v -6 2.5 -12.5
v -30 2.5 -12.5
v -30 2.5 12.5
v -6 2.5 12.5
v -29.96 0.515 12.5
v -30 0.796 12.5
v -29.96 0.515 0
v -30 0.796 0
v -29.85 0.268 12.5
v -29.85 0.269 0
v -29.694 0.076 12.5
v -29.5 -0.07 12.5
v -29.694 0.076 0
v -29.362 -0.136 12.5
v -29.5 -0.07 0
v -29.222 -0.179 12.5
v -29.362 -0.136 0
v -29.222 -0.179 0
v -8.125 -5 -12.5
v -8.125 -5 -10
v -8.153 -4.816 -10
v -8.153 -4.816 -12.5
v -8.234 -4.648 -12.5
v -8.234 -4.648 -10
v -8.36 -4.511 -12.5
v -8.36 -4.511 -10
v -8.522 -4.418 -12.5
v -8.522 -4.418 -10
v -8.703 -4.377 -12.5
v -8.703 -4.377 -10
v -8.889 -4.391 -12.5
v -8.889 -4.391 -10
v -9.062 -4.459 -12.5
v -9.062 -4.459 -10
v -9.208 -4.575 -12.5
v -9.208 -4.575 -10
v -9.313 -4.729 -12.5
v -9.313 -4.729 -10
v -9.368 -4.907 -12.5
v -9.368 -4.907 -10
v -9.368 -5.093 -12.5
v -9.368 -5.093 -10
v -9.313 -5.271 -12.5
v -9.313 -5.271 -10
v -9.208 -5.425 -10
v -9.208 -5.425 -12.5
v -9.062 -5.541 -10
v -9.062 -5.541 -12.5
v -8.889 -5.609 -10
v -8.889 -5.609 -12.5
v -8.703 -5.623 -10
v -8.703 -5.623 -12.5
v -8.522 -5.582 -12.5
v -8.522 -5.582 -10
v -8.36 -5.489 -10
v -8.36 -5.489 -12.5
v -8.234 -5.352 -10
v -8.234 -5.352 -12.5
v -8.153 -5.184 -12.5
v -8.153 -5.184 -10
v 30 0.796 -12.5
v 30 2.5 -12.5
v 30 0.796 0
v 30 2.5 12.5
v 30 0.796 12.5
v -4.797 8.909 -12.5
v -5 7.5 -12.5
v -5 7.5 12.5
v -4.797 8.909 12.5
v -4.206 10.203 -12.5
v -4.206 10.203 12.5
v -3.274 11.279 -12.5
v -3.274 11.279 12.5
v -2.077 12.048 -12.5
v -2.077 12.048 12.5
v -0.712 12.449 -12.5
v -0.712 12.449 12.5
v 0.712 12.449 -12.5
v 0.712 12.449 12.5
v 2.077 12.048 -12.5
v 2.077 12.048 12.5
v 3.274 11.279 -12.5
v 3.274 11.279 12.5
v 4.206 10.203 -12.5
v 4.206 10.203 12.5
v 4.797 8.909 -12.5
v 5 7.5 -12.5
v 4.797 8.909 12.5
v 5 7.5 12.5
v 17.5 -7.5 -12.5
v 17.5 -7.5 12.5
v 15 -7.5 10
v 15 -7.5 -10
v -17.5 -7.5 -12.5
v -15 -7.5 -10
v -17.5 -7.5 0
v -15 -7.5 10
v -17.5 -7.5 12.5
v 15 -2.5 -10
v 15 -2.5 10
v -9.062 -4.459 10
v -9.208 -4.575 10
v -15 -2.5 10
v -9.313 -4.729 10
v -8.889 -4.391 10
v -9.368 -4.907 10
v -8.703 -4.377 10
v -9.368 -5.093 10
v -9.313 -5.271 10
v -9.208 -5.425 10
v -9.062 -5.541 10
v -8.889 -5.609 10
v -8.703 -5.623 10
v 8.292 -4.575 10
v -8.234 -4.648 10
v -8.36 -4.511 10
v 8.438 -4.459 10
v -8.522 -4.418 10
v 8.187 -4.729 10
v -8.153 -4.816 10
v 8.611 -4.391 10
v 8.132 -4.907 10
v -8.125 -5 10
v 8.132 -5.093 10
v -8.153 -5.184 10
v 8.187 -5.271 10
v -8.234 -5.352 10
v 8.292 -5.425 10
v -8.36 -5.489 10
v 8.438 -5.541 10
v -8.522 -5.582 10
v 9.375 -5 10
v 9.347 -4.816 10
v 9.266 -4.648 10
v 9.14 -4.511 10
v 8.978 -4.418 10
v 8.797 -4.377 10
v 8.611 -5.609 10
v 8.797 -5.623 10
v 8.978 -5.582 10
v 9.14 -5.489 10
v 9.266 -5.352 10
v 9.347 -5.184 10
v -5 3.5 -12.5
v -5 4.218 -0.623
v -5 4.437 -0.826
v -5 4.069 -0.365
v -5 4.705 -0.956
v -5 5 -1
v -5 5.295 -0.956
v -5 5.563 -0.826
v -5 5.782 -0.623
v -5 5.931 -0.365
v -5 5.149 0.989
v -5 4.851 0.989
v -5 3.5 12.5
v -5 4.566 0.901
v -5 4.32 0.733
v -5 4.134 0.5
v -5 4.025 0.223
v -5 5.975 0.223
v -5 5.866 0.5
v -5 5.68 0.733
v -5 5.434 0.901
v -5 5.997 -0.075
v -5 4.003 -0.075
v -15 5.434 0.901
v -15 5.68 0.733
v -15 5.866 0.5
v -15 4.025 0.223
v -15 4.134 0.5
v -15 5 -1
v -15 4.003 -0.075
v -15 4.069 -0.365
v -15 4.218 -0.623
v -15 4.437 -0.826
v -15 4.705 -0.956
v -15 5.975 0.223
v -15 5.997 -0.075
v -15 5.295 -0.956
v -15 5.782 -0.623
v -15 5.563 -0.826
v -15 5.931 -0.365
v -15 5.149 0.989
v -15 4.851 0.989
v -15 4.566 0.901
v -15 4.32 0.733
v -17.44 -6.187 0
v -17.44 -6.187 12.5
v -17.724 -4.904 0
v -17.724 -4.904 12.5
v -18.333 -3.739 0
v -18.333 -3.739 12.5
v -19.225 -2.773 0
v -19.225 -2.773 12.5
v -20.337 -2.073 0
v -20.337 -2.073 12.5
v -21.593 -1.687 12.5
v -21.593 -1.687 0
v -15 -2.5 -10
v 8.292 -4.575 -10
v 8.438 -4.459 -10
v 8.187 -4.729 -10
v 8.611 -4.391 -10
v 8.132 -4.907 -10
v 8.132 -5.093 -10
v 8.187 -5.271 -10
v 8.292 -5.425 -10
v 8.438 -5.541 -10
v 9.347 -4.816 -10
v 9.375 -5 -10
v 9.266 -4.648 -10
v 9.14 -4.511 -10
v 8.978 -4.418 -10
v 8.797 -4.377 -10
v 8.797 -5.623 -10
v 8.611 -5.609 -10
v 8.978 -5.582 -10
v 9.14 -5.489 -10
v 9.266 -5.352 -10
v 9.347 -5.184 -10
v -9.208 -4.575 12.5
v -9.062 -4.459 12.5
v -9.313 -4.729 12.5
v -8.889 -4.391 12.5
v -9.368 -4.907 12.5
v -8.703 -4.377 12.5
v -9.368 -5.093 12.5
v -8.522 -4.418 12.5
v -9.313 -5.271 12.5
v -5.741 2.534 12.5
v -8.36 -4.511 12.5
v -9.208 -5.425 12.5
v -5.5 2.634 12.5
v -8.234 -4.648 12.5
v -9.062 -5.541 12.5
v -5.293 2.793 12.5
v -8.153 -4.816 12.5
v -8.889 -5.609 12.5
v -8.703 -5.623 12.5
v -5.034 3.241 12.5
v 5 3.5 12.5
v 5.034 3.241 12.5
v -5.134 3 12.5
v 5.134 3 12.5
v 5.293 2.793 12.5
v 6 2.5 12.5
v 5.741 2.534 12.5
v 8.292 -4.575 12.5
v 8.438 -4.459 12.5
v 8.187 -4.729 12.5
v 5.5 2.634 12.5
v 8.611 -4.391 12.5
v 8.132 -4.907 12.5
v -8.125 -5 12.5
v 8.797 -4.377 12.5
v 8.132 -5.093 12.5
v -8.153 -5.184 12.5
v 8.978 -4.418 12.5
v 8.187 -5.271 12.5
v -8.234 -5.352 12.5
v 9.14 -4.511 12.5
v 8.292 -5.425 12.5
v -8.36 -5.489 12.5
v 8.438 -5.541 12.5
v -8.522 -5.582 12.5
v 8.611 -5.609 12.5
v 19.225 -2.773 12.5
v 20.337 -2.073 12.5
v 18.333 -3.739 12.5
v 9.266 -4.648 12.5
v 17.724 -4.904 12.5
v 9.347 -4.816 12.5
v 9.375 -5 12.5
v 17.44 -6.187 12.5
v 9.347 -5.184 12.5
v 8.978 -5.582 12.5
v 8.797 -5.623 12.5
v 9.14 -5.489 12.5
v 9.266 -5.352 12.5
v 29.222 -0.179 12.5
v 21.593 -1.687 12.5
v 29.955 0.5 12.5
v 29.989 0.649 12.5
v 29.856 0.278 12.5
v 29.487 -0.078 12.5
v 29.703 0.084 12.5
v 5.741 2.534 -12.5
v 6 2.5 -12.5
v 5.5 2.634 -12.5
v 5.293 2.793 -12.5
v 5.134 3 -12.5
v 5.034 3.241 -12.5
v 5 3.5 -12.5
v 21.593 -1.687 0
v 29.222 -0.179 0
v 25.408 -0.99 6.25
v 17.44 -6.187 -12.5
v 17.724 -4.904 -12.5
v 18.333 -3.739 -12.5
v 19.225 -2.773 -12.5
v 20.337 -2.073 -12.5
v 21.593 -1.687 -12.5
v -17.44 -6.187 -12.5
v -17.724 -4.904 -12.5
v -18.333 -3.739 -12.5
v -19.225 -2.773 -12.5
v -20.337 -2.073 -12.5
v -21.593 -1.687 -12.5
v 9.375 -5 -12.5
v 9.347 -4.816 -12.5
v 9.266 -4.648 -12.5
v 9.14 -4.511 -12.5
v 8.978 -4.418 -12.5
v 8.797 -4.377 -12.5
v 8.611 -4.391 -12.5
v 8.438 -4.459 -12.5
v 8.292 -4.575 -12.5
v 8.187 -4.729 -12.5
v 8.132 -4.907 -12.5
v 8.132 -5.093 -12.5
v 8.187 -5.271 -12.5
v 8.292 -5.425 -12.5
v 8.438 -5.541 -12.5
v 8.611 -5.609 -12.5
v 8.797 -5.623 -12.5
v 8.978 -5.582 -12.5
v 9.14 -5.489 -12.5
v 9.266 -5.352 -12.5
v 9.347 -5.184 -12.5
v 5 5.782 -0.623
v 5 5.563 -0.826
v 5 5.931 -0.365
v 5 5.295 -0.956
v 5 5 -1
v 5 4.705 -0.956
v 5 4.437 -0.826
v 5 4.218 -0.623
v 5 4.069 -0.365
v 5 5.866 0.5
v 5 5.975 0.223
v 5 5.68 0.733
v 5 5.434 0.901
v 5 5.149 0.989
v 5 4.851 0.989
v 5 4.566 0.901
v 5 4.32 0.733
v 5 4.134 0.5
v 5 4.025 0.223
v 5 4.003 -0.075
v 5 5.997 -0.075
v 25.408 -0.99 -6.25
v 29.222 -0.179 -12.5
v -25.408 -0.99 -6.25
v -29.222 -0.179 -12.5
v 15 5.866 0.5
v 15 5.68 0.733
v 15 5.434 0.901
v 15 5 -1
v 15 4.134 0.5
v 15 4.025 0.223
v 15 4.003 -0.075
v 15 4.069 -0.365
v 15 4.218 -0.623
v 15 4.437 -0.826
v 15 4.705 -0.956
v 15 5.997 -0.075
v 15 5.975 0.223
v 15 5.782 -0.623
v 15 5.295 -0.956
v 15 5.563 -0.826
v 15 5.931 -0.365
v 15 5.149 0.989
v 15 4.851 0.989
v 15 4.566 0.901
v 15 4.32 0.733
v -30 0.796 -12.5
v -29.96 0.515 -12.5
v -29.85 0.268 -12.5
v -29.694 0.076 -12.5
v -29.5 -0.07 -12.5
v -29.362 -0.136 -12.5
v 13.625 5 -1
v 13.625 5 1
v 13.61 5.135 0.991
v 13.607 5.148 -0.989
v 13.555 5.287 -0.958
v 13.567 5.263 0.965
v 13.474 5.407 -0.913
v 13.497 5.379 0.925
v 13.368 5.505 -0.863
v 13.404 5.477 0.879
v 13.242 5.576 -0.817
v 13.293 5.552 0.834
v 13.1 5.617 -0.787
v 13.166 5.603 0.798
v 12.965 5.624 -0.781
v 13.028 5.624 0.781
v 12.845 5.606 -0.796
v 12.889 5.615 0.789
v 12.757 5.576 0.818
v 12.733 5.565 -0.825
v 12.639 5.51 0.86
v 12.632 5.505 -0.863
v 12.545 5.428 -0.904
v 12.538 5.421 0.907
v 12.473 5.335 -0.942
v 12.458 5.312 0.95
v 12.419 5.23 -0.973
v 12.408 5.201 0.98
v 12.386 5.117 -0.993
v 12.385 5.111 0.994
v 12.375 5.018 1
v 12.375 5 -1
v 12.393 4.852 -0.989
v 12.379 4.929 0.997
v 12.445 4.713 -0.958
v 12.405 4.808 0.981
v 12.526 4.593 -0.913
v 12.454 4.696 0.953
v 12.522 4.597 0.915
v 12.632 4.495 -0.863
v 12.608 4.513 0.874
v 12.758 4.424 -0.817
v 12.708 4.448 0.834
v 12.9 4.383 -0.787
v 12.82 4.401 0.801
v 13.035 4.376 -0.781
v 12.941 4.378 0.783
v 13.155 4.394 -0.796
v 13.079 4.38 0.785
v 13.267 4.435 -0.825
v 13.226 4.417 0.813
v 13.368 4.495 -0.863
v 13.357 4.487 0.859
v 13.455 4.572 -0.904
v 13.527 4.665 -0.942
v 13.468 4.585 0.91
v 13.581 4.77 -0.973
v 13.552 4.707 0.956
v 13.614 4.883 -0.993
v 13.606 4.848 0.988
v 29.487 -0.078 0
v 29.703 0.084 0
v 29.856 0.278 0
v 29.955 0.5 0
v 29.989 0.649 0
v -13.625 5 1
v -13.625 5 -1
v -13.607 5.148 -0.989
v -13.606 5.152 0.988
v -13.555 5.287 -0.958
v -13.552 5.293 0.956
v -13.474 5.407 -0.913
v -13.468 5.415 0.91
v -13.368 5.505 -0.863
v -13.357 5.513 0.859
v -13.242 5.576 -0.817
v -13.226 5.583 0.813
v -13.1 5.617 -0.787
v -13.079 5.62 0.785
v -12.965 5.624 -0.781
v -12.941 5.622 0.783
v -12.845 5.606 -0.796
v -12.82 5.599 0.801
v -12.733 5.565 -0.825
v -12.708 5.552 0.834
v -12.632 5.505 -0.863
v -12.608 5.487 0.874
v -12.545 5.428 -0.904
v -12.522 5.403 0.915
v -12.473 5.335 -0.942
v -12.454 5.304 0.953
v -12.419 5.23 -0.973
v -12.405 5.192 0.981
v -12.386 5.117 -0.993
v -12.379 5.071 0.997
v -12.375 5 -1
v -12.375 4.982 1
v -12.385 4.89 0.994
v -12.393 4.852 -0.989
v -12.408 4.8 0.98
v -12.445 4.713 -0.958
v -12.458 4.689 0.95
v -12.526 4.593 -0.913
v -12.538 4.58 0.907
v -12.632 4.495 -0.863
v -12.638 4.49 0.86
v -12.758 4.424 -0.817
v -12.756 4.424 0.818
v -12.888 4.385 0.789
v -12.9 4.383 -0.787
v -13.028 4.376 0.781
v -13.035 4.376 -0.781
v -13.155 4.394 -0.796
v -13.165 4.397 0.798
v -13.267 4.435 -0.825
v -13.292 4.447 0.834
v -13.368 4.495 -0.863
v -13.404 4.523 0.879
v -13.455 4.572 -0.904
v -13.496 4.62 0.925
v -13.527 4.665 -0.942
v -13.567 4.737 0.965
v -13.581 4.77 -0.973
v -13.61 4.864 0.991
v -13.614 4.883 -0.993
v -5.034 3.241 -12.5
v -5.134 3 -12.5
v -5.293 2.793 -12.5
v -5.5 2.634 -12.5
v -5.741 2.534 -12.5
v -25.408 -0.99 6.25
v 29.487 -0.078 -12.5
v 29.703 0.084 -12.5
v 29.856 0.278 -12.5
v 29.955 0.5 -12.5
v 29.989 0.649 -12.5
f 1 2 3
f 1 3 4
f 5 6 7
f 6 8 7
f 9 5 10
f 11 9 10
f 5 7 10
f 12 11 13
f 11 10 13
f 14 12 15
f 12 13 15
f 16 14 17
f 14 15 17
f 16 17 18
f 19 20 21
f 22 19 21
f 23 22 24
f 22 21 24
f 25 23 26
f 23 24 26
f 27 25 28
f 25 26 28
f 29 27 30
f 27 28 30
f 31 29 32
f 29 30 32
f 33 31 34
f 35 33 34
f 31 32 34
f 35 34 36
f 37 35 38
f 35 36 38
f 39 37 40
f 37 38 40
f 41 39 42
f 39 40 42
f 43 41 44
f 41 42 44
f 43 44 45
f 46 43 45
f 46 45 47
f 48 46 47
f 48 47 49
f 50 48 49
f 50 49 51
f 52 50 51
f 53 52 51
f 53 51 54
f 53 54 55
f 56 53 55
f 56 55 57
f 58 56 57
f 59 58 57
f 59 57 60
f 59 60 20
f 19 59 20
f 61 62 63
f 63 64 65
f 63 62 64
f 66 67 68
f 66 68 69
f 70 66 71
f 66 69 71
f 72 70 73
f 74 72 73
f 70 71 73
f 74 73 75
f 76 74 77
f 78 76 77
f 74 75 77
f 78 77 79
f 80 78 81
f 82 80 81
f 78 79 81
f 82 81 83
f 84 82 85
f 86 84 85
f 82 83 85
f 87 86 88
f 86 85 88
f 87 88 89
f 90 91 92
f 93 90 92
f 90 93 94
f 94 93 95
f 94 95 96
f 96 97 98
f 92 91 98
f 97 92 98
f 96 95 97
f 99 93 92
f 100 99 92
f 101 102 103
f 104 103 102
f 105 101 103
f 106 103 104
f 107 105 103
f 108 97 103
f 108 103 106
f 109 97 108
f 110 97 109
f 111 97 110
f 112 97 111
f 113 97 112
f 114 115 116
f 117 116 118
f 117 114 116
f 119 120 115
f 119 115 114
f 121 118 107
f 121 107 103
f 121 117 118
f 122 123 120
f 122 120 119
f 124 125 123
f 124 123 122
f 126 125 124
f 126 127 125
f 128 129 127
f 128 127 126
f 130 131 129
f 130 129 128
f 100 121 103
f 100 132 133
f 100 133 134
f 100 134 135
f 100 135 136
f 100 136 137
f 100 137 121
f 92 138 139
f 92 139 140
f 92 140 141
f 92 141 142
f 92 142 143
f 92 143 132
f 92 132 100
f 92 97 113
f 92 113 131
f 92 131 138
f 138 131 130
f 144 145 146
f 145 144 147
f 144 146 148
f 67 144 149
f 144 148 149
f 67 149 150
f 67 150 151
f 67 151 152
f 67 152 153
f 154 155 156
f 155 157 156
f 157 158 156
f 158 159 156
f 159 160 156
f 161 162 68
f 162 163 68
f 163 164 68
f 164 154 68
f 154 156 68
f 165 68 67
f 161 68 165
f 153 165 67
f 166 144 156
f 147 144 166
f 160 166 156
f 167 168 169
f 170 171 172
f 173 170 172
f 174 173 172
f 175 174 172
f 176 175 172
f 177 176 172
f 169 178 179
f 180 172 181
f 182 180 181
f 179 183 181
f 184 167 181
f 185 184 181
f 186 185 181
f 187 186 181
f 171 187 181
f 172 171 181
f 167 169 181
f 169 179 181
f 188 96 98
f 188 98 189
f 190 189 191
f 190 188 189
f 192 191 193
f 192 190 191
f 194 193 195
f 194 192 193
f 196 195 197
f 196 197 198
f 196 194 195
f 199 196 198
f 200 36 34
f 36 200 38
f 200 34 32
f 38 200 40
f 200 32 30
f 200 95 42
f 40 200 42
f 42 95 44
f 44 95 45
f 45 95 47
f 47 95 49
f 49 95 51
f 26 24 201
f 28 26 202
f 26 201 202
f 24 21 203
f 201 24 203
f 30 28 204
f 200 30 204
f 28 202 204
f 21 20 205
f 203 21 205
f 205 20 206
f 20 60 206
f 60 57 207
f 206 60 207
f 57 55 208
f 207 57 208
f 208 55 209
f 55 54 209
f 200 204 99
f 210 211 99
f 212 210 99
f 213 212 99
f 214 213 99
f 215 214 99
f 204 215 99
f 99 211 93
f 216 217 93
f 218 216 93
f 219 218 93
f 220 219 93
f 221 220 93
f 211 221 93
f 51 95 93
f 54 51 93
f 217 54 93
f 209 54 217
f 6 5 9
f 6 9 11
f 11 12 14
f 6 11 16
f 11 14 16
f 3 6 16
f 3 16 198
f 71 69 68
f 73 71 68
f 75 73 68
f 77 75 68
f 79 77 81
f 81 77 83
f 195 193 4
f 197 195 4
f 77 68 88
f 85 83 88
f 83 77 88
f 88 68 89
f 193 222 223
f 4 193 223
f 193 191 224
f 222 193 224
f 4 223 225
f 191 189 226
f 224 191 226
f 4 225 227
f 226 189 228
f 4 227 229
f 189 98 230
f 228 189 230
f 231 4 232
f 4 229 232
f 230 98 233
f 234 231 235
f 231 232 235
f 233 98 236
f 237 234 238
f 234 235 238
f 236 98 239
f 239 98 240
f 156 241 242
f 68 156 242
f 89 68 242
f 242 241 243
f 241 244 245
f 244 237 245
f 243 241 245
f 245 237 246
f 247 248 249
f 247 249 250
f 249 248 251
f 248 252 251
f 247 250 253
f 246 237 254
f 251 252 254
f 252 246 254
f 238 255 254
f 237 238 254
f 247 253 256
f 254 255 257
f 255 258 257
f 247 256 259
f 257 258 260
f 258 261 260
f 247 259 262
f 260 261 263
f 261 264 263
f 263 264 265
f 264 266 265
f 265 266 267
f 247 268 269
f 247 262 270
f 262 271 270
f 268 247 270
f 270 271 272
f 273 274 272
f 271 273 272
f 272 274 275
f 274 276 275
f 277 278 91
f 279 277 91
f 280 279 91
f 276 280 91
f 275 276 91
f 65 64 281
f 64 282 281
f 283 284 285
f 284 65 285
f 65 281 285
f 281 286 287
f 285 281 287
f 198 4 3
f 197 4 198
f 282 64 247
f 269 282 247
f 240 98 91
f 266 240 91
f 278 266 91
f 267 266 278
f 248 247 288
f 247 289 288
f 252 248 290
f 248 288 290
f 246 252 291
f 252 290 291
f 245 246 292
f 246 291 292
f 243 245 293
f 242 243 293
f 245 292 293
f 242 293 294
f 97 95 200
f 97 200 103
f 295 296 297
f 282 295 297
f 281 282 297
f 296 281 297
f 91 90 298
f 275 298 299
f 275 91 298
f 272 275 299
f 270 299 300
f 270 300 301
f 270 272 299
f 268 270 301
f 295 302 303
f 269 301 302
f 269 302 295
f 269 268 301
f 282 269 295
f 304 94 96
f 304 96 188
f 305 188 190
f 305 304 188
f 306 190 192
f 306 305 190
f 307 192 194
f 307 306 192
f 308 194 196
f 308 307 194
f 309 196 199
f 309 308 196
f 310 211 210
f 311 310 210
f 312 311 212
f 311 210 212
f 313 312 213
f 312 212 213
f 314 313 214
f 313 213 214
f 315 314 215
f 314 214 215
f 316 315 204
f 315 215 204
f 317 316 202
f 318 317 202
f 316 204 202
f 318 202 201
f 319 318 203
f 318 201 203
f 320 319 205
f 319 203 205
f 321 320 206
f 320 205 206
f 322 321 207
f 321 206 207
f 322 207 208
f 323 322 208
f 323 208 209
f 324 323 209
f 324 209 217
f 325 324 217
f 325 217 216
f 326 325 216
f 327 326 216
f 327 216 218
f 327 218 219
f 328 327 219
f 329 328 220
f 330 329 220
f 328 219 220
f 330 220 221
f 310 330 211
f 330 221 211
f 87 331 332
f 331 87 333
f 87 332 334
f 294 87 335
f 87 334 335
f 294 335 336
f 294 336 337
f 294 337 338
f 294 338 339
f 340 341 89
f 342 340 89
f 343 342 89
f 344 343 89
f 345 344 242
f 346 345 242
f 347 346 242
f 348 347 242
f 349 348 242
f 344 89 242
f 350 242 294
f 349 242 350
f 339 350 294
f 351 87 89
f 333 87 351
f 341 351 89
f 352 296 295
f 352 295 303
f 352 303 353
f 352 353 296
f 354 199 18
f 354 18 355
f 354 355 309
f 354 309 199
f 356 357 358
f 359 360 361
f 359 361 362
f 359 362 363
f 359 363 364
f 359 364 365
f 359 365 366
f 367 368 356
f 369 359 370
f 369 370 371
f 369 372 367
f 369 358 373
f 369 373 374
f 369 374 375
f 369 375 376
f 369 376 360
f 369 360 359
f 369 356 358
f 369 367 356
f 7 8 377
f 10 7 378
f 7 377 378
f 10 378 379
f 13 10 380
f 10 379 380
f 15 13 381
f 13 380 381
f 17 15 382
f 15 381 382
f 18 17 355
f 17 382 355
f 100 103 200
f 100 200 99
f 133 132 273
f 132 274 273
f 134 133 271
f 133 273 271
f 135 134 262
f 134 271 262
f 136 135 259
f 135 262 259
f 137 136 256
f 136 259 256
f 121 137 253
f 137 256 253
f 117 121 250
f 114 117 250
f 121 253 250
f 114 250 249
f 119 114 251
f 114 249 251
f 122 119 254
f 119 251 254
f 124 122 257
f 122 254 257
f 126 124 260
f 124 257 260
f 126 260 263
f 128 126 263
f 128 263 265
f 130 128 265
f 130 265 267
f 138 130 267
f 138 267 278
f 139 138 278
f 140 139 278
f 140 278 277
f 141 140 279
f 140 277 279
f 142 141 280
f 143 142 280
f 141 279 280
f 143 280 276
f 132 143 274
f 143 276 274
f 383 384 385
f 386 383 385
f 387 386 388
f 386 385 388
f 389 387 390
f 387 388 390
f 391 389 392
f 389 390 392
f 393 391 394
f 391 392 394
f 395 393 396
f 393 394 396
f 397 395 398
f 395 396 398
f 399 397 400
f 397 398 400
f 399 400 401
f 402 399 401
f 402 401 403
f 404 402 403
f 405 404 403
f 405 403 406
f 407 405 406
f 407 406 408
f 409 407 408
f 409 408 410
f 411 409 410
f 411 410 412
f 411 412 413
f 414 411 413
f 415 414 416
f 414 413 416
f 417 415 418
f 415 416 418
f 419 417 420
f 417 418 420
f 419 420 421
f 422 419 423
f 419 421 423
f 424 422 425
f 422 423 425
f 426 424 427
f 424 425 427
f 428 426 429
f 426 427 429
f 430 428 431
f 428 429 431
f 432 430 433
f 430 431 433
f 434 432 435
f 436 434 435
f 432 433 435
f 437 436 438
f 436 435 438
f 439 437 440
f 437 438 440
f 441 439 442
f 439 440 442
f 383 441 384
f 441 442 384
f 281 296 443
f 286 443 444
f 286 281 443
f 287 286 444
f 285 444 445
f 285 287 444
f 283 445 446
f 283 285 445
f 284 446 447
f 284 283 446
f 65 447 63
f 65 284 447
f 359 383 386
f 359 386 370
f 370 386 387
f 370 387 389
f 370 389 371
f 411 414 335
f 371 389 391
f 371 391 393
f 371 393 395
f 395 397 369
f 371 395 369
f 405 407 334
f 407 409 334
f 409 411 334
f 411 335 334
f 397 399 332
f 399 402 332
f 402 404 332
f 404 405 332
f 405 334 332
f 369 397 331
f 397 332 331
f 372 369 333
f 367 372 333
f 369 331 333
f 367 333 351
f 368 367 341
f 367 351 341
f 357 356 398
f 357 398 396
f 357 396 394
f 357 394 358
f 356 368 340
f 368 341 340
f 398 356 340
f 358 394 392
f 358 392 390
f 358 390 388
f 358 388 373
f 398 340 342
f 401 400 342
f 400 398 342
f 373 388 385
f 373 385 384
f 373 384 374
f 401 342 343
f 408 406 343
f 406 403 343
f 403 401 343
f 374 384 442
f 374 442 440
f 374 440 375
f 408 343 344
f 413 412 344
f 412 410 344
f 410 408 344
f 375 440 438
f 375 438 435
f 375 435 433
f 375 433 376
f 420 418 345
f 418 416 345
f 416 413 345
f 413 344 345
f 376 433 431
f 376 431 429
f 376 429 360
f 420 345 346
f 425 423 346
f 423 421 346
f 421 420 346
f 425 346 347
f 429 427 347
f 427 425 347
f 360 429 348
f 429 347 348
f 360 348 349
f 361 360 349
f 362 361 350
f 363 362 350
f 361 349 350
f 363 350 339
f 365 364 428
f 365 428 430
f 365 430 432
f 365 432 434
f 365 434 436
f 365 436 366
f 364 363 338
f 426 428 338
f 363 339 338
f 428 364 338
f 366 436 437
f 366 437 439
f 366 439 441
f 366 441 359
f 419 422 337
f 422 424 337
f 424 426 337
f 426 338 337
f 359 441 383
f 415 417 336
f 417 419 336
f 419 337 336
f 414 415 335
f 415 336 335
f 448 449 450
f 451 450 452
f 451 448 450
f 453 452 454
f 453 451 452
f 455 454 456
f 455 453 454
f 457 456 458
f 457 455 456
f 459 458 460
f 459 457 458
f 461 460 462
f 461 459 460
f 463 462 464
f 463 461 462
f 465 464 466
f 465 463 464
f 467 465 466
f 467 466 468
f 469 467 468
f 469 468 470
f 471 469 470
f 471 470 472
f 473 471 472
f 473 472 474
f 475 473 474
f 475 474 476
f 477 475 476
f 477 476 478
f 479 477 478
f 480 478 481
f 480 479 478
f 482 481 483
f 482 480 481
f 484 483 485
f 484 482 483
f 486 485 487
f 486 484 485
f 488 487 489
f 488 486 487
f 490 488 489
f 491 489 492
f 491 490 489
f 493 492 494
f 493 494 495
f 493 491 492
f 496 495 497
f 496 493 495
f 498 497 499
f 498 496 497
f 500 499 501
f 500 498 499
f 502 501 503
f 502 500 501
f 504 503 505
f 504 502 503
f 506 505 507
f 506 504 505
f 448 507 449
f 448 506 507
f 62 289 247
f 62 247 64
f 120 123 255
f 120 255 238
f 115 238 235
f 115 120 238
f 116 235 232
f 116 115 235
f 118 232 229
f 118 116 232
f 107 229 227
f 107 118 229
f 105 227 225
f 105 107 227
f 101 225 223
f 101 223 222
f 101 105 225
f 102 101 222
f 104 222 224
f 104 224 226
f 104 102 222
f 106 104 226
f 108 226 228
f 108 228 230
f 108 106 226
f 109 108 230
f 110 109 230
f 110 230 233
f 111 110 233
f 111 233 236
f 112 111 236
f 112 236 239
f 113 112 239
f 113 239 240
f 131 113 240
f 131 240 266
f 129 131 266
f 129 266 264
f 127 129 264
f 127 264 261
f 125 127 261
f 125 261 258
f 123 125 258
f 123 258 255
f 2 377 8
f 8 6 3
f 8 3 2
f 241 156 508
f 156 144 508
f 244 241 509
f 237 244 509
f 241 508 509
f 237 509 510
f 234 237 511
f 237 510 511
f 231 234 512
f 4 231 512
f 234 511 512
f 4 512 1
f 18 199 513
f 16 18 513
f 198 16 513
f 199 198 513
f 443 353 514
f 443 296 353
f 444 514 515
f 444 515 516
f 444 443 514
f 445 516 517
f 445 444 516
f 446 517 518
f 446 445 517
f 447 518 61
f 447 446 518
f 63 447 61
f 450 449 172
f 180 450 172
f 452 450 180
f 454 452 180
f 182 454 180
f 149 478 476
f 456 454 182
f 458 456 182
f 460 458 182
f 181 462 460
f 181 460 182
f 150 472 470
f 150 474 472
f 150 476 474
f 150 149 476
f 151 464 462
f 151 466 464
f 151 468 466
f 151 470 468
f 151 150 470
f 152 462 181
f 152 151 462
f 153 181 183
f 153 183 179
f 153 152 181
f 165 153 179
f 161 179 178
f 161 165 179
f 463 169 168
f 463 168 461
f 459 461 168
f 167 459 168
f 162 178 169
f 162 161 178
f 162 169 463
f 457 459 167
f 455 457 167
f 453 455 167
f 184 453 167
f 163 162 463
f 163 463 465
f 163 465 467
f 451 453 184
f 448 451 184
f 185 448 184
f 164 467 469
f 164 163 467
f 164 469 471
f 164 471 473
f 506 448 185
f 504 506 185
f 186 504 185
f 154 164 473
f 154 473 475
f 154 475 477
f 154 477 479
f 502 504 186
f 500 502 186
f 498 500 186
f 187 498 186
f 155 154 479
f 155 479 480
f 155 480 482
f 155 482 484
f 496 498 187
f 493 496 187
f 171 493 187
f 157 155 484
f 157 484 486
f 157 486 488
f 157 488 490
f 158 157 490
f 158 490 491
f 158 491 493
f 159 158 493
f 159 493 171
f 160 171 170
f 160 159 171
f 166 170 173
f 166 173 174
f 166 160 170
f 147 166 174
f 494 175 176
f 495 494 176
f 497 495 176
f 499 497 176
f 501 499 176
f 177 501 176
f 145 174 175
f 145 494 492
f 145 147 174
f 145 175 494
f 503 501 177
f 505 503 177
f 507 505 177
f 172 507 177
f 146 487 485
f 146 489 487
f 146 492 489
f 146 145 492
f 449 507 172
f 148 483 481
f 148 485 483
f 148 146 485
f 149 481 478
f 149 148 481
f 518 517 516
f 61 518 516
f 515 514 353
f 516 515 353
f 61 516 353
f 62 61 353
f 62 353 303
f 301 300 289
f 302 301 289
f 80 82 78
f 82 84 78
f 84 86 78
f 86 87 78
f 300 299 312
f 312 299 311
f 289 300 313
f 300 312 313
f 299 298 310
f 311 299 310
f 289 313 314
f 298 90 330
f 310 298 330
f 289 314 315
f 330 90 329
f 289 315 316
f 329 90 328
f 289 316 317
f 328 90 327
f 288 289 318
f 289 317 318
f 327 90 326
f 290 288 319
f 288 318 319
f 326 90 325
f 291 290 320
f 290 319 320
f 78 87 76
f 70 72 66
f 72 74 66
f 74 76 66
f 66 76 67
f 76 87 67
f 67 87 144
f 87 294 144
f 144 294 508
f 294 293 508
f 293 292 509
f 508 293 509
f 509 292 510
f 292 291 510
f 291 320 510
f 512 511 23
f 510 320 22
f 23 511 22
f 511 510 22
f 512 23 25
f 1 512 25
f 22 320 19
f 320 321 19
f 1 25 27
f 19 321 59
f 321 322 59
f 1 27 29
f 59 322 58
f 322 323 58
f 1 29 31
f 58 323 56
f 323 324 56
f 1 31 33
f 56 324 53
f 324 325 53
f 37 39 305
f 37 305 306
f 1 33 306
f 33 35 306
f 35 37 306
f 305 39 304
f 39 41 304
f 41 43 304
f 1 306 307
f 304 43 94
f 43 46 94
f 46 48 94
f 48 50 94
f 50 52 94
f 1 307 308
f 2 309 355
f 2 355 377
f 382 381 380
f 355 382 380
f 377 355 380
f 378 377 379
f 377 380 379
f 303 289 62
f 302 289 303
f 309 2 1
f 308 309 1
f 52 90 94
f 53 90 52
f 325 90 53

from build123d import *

# Parameters (mm, degrees)
BOSS_EXTRUDE1_DEPTH = 12.5
SKETCH15_R          = 1
BOSS_EXTRUDE2_DEPTH = 10
SKETCH19_R          = 0.625
CUT_EXTRUDE2_DEPTH  = 1
FILLET1_R           = 1
FILLET9_R           = 5
SKETCH32_W          = 30
SKETCH32_H          = 20
CUT_EXTRUDE10_DEPTH = 5
SKETCH34_R          = 0.625
CUT_EXTRUDE9_DEPTH  = 12.5


with BuildPart() as part:
    # Sketch1 → Boss-Extrude1 (new, symmetric)
    with BuildSketch(Plane.XY):
        with BuildLine():
            Line((-30, 2.5), (30, 2.5))
            Line((30, 2.5), (30, 0))
            add(Edge.make_bspline(
                [(-30, 0), (0, -7), (30, 0)],
                knots=[0, 0, 0, 1, 1, 1], degree=2))
            Line((-30, 0), (-30, 2.5))
        make_face()
        with BuildLine():
            Line((5, 7.5), (5, -3.402777778))
            Line((5, -3.402777778), (17.5, -7.5))
            Line((17.5, -7.5), (-17.5, -7.5))
            Line((-17.5, -7.5), (-5, -3.402777778))
            Line((-5, -3.402777778), (-5, 7.5))
            ThreePointArc((-5, 7.5), (0, 12.5), (5, 7.5))
        make_face()
    extrude(amount=BOSS_EXTRUDE1_DEPTH, both=True)

    # Sketch15 → Boss-Extrude2 (add)
    with BuildSketch(Plane(origin=(5, 0, 0), x_dir=(0, 0, -1), z_dir=(1, 0, 0))):
        with Locations((0, 5)):
            Circle(SKETCH15_R)
    boss_extrude2 = extrude(amount=BOSS_EXTRUDE2_DEPTH)

    # Sketch19 → Cut-Extrude2 (cut, symmetric)
    with BuildSketch(Plane.XY):
        with Locations((13, 5)):
            Circle(SKETCH19_R)
    cut_extrude2 = extrude(amount=CUT_EXTRUDE2_DEPTH, both=True, mode=Mode.SUBTRACT)

    # Mirror1: Boss-Extrude2, Cut-Extrude2 across plane
    add(boss_extrude2.mirror(Plane(origin=(0, 0, 0), x_dir=(0, 0, 1), z_dir=(1, 0, 0))))
    add(cut_extrude2.mirror(Plane(origin=(0, 0, 0), x_dir=(0, 0, 1), z_dir=(1, 0, 0))), mode=Mode.SUBTRACT)

    # Fillet1
    fillet1_edges = [part.edges().sort_by_distance(p)[0] for p in [
        (-30, 0, -6.25),
        (30, 0, 6.25),
        (5, 2.5, 0),
        (-5, 2.5, 0),
    ]]
    fillet(fillet1_edges, radius=FILLET1_R)

    # Fillet9
    # the kernel refuses this fillet: 5 mm, written as the material it adds along each edge
    with BuildSketch(Plane(origin=(5, -3.402777778, 12.5), x_dir=(0.9502551587034467, -0.3114725242416856, 0), z_dir=(0, 0, -1))) as fillet9_piece_1_section:
        with BuildLine():
            CenterArc((17.556244054, -2.371377478), FILLET9_R, 151.687811906, 90.630424807)
            Line((15.233443006, -6.799085157), (15.186986985, -6.88763931))
            ThreePointArc((15.186986985, -6.88763931), (7.684520329, -3.247724547), (-0.034816372, -0.093743374))
            Line((-0.034816372, -0.093743374), (0, 0.1))
            ThreePointArc((0, 0.1), (6.577180816, 0.1), (13.066323983, 0.04742755))
            Line((13.066323983, 0.04742755), (13.154361632, 0))
        make_face()
    fillet9_piece_1 = extrude(amount=12.5, mode=Mode.PRIVATE)
    fillet9_piece_1 = split(fillet9_piece_1, bisect_by=Plane(origin=(13.76615202, -7.5, 6.25), z_dir=(0, 1, 0)), keep=Keep.TOP, mode=Mode.PRIVATE)
    add(fillet9_piece_1)
    with BuildSketch(Plane(origin=(-5, -3.402777778, 0), x_dir=(-0.9946948021356532, 0.10287006660984462, 0), z_dir=(0, 0, 1))) as fillet9_piece_2_section:
        with BuildLine():
            CenterArc((16.998391443, 4.989972421), FILLET9_R, 175.740271774, 90.630424807)
            Line((12.012203504, 5.36136148), (11.912479745, 5.368789261))
            ThreePointArc((11.912479745, 5.368789261), (5.965344461, 2.771998007), (-0.040757291, 0.091317267))
            Line((-0.040757291, 0.091317267), (0.006413901, -0.099794097))
            ThreePointArc((0.006413901, -0.099794097), (8.340978482, 0.166269042), (16.675556633, -0.099799448))
            Line((16.675556633, -0.099799448), (16.681886727, 0))
        make_face()
    fillet9_piece_2 = extrude(amount=12.5, mode=Mode.PRIVATE)
    fillet9_piece_2 = split(fillet9_piece_2, bisect_by=Plane(origin=(-13.76615202, -7.5, 6.25), z_dir=(0, 1, 0)), keep=Keep.TOP, mode=Mode.PRIVATE)
    add(fillet9_piece_2)
    with BuildSketch(Plane(origin=(-5, -3.402777778, -12.5), x_dir=(-0.9502551587034468, -0.31147252424168526, 0), z_dir=(0, 0, 1))) as fillet9_piece_3_section:
        with BuildLine():
            CenterArc((17.556244054, -2.371377478), FILLET9_R, 151.687811906, 90.630424807)
            Line((15.233443006, -6.799085157), (15.186986985, -6.88763931))
            ThreePointArc((15.186986985, -6.88763931), (7.684520329, -3.247724547), (-0.034816372, -0.093743374))
            Line((-0.034816372, -0.093743374), (0, 0.1))
            ThreePointArc((0, 0.1), (6.577180816, 0.1), (13.066323983, 0.04742755))
            Line((13.066323983, 0.04742755), (13.154361632, 0))
        make_face()
    fillet9_piece_3 = extrude(amount=12.5, mode=Mode.PRIVATE)
    fillet9_piece_3 = split(fillet9_piece_3, bisect_by=Plane(origin=(-13.76615202, -7.5, -6.25), z_dir=(0, 1, 0)), keep=Keep.TOP, mode=Mode.PRIVATE)
    add(fillet9_piece_3)
    with BuildSketch(Plane(origin=(5, -3.402777778, 0), x_dir=(0.9502551587034467, -0.3114725242416856, 0), z_dir=(0, 0, -1))) as fillet9_piece_4_section:
        with BuildLine():
            CenterArc((17.556244054, -2.371377478), FILLET9_R, 151.687811906, 90.630424807)
            Line((15.233443006, -6.799085157), (15.186986985, -6.88763931))
            ThreePointArc((15.186986985, -6.88763931), (7.684520329, -3.247724547), (-0.034816372, -0.093743374))
            Line((-0.034816372, -0.093743374), (0, 0.1))
            ThreePointArc((0, 0.1), (6.577180816, 0.1), (13.066323983, 0.04742755))
            Line((13.066323983, 0.04742755), (13.154361632, 0))
        make_face()
    fillet9_piece_4 = extrude(amount=12.5, mode=Mode.PRIVATE)
    fillet9_piece_4 = split(fillet9_piece_4, bisect_by=Plane(origin=(13.76615202, -7.5, -6.25), z_dir=(0, 1, 0)), keep=Keep.TOP, mode=Mode.PRIVATE)
    add(fillet9_piece_4)

    # Sketch32 → Cut-Extrude10 (cut)
    with BuildSketch(Plane.XZ.offset(7.5)):
        Rectangle(SKETCH32_W, SKETCH32_H)
    extrude(amount=-CUT_EXTRUDE10_DEPTH, mode=Mode.SUBTRACT)

    # Sketch34 → Cut-Extrude9 (cut, symmetric)
    with BuildSketch(Plane.XY):
        with Locations((-8.75, -5)):
            Circle(SKETCH34_R)
        with Locations((8.75, -5)):
            Circle(SKETCH34_R)
    extrude(amount=CUT_EXTRUDE9_DEPTH, both=True, mode=Mode.SUBTRACT)


solid = part.part
